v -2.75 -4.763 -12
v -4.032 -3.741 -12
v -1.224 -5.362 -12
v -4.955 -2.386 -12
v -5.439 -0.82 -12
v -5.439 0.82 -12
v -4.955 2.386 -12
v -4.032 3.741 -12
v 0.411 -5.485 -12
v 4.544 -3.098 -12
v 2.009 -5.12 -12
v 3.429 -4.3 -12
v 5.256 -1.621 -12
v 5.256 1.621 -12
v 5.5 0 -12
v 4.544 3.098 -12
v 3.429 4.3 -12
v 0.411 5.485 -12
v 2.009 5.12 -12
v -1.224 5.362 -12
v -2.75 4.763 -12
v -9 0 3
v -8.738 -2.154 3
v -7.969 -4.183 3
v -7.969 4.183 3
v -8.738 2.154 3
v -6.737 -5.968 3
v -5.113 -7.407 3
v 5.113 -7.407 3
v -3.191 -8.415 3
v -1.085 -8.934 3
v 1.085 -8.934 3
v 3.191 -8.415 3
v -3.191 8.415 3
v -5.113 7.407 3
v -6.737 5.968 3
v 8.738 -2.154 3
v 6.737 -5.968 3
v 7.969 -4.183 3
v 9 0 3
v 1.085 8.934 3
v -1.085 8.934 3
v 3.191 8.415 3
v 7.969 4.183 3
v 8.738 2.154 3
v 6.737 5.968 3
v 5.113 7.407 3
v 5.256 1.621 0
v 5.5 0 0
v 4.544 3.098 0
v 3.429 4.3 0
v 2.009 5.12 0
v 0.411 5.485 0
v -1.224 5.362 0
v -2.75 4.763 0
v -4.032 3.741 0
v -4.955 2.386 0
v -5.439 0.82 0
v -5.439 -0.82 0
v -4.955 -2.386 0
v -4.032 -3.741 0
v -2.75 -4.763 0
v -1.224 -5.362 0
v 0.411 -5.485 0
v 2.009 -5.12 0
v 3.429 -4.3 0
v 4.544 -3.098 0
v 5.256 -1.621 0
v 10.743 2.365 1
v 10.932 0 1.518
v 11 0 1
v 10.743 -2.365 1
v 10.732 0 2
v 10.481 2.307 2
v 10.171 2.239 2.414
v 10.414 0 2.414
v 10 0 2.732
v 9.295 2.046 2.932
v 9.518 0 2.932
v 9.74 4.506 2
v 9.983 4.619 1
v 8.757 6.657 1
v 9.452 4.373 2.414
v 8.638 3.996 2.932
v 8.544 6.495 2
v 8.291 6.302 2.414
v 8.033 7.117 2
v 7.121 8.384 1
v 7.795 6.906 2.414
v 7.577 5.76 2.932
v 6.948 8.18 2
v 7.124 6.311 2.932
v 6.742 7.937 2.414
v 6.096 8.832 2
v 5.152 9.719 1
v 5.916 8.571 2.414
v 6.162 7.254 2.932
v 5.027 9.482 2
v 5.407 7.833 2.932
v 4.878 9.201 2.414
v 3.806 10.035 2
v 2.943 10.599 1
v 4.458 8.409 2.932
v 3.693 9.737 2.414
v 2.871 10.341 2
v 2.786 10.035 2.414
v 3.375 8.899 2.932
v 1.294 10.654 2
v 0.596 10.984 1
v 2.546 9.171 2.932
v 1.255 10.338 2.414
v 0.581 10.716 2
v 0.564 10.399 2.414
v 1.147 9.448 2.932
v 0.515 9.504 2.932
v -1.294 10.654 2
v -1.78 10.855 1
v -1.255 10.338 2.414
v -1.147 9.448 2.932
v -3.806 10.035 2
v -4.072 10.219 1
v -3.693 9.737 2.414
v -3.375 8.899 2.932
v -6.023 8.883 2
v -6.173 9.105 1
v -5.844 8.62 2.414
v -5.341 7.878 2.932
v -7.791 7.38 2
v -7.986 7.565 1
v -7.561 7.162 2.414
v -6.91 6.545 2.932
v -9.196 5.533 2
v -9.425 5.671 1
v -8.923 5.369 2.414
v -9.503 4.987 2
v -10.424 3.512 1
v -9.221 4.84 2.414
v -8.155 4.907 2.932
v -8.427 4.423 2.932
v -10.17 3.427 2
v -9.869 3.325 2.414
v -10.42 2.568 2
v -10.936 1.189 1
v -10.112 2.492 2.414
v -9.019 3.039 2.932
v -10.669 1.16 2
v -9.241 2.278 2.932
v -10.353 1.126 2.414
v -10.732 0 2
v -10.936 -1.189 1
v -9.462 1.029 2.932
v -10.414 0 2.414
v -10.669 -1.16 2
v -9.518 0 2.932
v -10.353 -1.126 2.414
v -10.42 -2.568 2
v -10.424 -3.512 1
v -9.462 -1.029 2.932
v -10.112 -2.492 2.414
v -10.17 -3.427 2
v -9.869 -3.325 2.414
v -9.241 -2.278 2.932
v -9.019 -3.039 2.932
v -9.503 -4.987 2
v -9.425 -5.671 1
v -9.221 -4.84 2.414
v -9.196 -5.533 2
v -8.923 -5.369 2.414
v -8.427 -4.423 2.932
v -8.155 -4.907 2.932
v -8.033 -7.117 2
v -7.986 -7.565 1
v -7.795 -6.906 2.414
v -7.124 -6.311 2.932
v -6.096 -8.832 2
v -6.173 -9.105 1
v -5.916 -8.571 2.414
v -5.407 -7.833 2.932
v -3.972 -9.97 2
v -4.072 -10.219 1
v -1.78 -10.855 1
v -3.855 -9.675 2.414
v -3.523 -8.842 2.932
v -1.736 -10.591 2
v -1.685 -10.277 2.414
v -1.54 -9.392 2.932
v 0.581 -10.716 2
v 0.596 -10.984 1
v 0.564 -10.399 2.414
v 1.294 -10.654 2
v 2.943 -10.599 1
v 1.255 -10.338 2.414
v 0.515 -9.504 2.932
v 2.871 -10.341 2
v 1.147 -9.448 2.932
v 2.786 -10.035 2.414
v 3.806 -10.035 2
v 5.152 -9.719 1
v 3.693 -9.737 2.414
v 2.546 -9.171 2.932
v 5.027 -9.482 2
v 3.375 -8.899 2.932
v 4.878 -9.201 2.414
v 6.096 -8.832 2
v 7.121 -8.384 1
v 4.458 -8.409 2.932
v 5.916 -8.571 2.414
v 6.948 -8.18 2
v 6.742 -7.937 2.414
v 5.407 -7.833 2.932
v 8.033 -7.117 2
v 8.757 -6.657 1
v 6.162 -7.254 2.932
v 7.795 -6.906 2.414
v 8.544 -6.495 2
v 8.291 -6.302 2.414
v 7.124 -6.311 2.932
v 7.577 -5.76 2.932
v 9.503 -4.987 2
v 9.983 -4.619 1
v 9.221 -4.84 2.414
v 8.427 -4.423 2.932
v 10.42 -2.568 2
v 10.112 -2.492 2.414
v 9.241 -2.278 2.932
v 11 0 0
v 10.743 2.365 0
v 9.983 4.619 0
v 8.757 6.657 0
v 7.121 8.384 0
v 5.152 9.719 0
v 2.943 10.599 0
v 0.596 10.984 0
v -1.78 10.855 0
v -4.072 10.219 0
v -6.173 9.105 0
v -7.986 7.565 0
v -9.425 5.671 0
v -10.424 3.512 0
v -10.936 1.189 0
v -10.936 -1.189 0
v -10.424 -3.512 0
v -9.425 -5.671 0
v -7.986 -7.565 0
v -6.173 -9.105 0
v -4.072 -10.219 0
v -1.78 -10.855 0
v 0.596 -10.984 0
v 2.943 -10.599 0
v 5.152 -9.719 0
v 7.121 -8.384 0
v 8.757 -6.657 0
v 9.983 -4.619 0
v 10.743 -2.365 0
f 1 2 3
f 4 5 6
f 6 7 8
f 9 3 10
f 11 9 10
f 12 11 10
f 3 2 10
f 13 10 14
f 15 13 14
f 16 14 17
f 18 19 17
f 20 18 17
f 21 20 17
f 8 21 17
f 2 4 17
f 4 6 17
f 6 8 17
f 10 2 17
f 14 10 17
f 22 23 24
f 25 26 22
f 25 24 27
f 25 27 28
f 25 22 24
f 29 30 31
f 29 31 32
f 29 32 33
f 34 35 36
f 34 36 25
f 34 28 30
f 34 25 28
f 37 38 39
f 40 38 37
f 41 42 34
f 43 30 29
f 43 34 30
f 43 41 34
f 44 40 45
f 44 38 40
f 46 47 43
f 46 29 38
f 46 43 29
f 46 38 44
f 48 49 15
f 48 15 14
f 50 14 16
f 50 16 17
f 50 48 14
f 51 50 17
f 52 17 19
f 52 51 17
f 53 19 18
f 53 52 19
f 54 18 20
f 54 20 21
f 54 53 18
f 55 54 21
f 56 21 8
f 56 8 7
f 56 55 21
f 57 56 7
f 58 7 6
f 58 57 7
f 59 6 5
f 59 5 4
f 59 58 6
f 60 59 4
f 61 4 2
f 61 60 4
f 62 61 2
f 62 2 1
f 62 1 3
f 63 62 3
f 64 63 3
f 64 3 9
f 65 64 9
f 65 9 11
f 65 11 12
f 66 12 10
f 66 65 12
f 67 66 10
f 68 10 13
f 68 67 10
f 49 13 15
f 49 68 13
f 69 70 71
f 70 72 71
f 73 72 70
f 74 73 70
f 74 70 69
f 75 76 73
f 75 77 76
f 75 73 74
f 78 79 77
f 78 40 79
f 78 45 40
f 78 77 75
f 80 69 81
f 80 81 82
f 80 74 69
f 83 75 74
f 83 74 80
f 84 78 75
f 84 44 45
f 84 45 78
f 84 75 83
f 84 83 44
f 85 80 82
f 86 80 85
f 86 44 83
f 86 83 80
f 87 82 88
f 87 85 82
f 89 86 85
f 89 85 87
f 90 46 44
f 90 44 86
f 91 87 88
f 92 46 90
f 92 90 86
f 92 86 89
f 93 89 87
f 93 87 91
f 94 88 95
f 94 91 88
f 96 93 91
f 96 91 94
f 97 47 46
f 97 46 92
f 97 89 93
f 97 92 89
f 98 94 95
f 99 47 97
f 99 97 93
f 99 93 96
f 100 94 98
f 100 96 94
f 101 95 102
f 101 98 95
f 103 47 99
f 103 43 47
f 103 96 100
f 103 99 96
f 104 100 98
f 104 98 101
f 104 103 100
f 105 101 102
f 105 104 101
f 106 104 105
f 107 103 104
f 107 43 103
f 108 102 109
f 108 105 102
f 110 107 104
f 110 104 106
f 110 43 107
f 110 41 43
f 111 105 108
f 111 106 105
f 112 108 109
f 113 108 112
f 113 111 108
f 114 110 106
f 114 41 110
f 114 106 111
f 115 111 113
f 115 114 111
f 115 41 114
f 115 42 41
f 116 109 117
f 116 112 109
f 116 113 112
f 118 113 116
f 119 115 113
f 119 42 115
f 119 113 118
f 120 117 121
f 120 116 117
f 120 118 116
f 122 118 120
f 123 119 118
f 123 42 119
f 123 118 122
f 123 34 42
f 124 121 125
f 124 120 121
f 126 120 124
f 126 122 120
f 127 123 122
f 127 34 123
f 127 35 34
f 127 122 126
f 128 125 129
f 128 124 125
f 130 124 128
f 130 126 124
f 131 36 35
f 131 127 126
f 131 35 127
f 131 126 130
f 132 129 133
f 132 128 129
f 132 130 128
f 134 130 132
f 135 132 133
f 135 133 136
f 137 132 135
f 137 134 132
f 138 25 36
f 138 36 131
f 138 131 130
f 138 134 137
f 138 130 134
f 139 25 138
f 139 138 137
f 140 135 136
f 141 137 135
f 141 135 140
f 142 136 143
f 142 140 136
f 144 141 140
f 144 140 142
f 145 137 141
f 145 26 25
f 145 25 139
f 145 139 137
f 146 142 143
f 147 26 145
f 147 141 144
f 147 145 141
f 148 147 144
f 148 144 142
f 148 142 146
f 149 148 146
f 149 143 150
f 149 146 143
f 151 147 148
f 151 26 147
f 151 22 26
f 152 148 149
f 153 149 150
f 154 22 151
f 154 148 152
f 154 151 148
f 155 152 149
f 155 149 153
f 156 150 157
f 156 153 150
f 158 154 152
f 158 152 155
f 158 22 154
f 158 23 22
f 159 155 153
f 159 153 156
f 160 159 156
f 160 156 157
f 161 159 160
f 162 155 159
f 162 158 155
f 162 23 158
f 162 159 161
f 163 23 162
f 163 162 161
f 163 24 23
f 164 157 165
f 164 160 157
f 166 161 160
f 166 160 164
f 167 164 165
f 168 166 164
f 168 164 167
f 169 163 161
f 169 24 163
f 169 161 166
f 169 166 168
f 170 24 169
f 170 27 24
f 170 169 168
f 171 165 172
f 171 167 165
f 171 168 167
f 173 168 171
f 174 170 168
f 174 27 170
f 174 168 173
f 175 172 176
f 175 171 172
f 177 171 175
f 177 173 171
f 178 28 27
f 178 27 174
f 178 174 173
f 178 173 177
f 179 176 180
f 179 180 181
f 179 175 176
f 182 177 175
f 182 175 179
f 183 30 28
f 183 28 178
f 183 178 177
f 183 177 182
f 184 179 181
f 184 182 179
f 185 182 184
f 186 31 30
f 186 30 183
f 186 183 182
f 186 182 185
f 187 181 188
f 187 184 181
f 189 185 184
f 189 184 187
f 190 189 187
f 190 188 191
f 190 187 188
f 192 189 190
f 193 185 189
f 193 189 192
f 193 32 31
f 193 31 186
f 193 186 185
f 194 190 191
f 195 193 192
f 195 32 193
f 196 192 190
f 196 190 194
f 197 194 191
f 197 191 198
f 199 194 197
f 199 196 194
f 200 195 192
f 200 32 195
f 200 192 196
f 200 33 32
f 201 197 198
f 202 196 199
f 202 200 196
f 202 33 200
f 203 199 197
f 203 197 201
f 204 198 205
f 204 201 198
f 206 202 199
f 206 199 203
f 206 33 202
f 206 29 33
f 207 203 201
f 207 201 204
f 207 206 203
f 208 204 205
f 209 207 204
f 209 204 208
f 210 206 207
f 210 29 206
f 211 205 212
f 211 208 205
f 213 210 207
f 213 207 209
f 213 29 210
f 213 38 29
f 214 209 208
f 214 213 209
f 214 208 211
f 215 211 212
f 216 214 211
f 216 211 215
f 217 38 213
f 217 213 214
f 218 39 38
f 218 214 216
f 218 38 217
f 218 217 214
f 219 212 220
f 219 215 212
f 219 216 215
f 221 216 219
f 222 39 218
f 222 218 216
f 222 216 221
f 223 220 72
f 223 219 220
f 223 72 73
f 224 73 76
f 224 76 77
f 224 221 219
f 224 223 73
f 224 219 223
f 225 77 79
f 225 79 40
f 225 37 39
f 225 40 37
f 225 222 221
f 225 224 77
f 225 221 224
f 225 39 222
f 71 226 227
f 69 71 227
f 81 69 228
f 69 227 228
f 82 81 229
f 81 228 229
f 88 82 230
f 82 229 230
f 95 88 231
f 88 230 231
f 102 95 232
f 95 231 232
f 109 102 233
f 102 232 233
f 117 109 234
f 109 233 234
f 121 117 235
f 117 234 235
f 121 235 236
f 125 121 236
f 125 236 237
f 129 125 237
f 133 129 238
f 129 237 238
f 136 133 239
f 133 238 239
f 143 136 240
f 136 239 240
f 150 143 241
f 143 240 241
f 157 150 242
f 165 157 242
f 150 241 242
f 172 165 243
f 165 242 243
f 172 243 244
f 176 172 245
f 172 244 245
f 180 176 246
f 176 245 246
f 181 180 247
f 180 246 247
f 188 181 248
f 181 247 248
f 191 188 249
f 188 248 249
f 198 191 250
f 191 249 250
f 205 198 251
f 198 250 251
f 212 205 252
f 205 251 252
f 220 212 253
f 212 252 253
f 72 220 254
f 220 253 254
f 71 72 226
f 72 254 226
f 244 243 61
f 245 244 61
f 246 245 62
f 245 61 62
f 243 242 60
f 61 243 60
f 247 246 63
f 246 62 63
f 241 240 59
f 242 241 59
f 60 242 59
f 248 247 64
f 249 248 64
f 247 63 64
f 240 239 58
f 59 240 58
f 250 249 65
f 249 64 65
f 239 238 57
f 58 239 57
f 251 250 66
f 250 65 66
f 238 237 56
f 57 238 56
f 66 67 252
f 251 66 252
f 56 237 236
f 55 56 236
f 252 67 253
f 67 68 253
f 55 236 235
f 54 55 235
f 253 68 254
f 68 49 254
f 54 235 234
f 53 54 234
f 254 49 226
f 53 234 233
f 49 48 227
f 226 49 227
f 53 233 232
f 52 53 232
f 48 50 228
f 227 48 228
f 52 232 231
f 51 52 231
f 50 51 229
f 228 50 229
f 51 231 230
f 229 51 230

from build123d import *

# Parameters (mm, degrees)
F0_R     = 11
F0_R_2   = 5.5
F1_DEPTH = 3
F2_DEPTH = 12
F3_R     = 2


with BuildPart() as f1:
    # F0 (on Top) → F1 (new body)
    with BuildSketch(Plane.XY):
        Circle(F0_R)
        Circle(F0_R_2, mode=Mode.SUBTRACT)
        Circle(F0_R_2)
    extrude(amount=F1_DEPTH)

    # F0 (on Top) → F2 (join)
    with BuildSketch(Plane.XY):
        Circle(F0_R_2)
    extrude(amount=-F2_DEPTH)

    # F3
    f3_edges = [f1.edges().sort_by_distance(p)[0] for p in [
        (-11, 0, 3),
    ]]
    fillet(f3_edges, radius=F3_R)


solid = f1.part
